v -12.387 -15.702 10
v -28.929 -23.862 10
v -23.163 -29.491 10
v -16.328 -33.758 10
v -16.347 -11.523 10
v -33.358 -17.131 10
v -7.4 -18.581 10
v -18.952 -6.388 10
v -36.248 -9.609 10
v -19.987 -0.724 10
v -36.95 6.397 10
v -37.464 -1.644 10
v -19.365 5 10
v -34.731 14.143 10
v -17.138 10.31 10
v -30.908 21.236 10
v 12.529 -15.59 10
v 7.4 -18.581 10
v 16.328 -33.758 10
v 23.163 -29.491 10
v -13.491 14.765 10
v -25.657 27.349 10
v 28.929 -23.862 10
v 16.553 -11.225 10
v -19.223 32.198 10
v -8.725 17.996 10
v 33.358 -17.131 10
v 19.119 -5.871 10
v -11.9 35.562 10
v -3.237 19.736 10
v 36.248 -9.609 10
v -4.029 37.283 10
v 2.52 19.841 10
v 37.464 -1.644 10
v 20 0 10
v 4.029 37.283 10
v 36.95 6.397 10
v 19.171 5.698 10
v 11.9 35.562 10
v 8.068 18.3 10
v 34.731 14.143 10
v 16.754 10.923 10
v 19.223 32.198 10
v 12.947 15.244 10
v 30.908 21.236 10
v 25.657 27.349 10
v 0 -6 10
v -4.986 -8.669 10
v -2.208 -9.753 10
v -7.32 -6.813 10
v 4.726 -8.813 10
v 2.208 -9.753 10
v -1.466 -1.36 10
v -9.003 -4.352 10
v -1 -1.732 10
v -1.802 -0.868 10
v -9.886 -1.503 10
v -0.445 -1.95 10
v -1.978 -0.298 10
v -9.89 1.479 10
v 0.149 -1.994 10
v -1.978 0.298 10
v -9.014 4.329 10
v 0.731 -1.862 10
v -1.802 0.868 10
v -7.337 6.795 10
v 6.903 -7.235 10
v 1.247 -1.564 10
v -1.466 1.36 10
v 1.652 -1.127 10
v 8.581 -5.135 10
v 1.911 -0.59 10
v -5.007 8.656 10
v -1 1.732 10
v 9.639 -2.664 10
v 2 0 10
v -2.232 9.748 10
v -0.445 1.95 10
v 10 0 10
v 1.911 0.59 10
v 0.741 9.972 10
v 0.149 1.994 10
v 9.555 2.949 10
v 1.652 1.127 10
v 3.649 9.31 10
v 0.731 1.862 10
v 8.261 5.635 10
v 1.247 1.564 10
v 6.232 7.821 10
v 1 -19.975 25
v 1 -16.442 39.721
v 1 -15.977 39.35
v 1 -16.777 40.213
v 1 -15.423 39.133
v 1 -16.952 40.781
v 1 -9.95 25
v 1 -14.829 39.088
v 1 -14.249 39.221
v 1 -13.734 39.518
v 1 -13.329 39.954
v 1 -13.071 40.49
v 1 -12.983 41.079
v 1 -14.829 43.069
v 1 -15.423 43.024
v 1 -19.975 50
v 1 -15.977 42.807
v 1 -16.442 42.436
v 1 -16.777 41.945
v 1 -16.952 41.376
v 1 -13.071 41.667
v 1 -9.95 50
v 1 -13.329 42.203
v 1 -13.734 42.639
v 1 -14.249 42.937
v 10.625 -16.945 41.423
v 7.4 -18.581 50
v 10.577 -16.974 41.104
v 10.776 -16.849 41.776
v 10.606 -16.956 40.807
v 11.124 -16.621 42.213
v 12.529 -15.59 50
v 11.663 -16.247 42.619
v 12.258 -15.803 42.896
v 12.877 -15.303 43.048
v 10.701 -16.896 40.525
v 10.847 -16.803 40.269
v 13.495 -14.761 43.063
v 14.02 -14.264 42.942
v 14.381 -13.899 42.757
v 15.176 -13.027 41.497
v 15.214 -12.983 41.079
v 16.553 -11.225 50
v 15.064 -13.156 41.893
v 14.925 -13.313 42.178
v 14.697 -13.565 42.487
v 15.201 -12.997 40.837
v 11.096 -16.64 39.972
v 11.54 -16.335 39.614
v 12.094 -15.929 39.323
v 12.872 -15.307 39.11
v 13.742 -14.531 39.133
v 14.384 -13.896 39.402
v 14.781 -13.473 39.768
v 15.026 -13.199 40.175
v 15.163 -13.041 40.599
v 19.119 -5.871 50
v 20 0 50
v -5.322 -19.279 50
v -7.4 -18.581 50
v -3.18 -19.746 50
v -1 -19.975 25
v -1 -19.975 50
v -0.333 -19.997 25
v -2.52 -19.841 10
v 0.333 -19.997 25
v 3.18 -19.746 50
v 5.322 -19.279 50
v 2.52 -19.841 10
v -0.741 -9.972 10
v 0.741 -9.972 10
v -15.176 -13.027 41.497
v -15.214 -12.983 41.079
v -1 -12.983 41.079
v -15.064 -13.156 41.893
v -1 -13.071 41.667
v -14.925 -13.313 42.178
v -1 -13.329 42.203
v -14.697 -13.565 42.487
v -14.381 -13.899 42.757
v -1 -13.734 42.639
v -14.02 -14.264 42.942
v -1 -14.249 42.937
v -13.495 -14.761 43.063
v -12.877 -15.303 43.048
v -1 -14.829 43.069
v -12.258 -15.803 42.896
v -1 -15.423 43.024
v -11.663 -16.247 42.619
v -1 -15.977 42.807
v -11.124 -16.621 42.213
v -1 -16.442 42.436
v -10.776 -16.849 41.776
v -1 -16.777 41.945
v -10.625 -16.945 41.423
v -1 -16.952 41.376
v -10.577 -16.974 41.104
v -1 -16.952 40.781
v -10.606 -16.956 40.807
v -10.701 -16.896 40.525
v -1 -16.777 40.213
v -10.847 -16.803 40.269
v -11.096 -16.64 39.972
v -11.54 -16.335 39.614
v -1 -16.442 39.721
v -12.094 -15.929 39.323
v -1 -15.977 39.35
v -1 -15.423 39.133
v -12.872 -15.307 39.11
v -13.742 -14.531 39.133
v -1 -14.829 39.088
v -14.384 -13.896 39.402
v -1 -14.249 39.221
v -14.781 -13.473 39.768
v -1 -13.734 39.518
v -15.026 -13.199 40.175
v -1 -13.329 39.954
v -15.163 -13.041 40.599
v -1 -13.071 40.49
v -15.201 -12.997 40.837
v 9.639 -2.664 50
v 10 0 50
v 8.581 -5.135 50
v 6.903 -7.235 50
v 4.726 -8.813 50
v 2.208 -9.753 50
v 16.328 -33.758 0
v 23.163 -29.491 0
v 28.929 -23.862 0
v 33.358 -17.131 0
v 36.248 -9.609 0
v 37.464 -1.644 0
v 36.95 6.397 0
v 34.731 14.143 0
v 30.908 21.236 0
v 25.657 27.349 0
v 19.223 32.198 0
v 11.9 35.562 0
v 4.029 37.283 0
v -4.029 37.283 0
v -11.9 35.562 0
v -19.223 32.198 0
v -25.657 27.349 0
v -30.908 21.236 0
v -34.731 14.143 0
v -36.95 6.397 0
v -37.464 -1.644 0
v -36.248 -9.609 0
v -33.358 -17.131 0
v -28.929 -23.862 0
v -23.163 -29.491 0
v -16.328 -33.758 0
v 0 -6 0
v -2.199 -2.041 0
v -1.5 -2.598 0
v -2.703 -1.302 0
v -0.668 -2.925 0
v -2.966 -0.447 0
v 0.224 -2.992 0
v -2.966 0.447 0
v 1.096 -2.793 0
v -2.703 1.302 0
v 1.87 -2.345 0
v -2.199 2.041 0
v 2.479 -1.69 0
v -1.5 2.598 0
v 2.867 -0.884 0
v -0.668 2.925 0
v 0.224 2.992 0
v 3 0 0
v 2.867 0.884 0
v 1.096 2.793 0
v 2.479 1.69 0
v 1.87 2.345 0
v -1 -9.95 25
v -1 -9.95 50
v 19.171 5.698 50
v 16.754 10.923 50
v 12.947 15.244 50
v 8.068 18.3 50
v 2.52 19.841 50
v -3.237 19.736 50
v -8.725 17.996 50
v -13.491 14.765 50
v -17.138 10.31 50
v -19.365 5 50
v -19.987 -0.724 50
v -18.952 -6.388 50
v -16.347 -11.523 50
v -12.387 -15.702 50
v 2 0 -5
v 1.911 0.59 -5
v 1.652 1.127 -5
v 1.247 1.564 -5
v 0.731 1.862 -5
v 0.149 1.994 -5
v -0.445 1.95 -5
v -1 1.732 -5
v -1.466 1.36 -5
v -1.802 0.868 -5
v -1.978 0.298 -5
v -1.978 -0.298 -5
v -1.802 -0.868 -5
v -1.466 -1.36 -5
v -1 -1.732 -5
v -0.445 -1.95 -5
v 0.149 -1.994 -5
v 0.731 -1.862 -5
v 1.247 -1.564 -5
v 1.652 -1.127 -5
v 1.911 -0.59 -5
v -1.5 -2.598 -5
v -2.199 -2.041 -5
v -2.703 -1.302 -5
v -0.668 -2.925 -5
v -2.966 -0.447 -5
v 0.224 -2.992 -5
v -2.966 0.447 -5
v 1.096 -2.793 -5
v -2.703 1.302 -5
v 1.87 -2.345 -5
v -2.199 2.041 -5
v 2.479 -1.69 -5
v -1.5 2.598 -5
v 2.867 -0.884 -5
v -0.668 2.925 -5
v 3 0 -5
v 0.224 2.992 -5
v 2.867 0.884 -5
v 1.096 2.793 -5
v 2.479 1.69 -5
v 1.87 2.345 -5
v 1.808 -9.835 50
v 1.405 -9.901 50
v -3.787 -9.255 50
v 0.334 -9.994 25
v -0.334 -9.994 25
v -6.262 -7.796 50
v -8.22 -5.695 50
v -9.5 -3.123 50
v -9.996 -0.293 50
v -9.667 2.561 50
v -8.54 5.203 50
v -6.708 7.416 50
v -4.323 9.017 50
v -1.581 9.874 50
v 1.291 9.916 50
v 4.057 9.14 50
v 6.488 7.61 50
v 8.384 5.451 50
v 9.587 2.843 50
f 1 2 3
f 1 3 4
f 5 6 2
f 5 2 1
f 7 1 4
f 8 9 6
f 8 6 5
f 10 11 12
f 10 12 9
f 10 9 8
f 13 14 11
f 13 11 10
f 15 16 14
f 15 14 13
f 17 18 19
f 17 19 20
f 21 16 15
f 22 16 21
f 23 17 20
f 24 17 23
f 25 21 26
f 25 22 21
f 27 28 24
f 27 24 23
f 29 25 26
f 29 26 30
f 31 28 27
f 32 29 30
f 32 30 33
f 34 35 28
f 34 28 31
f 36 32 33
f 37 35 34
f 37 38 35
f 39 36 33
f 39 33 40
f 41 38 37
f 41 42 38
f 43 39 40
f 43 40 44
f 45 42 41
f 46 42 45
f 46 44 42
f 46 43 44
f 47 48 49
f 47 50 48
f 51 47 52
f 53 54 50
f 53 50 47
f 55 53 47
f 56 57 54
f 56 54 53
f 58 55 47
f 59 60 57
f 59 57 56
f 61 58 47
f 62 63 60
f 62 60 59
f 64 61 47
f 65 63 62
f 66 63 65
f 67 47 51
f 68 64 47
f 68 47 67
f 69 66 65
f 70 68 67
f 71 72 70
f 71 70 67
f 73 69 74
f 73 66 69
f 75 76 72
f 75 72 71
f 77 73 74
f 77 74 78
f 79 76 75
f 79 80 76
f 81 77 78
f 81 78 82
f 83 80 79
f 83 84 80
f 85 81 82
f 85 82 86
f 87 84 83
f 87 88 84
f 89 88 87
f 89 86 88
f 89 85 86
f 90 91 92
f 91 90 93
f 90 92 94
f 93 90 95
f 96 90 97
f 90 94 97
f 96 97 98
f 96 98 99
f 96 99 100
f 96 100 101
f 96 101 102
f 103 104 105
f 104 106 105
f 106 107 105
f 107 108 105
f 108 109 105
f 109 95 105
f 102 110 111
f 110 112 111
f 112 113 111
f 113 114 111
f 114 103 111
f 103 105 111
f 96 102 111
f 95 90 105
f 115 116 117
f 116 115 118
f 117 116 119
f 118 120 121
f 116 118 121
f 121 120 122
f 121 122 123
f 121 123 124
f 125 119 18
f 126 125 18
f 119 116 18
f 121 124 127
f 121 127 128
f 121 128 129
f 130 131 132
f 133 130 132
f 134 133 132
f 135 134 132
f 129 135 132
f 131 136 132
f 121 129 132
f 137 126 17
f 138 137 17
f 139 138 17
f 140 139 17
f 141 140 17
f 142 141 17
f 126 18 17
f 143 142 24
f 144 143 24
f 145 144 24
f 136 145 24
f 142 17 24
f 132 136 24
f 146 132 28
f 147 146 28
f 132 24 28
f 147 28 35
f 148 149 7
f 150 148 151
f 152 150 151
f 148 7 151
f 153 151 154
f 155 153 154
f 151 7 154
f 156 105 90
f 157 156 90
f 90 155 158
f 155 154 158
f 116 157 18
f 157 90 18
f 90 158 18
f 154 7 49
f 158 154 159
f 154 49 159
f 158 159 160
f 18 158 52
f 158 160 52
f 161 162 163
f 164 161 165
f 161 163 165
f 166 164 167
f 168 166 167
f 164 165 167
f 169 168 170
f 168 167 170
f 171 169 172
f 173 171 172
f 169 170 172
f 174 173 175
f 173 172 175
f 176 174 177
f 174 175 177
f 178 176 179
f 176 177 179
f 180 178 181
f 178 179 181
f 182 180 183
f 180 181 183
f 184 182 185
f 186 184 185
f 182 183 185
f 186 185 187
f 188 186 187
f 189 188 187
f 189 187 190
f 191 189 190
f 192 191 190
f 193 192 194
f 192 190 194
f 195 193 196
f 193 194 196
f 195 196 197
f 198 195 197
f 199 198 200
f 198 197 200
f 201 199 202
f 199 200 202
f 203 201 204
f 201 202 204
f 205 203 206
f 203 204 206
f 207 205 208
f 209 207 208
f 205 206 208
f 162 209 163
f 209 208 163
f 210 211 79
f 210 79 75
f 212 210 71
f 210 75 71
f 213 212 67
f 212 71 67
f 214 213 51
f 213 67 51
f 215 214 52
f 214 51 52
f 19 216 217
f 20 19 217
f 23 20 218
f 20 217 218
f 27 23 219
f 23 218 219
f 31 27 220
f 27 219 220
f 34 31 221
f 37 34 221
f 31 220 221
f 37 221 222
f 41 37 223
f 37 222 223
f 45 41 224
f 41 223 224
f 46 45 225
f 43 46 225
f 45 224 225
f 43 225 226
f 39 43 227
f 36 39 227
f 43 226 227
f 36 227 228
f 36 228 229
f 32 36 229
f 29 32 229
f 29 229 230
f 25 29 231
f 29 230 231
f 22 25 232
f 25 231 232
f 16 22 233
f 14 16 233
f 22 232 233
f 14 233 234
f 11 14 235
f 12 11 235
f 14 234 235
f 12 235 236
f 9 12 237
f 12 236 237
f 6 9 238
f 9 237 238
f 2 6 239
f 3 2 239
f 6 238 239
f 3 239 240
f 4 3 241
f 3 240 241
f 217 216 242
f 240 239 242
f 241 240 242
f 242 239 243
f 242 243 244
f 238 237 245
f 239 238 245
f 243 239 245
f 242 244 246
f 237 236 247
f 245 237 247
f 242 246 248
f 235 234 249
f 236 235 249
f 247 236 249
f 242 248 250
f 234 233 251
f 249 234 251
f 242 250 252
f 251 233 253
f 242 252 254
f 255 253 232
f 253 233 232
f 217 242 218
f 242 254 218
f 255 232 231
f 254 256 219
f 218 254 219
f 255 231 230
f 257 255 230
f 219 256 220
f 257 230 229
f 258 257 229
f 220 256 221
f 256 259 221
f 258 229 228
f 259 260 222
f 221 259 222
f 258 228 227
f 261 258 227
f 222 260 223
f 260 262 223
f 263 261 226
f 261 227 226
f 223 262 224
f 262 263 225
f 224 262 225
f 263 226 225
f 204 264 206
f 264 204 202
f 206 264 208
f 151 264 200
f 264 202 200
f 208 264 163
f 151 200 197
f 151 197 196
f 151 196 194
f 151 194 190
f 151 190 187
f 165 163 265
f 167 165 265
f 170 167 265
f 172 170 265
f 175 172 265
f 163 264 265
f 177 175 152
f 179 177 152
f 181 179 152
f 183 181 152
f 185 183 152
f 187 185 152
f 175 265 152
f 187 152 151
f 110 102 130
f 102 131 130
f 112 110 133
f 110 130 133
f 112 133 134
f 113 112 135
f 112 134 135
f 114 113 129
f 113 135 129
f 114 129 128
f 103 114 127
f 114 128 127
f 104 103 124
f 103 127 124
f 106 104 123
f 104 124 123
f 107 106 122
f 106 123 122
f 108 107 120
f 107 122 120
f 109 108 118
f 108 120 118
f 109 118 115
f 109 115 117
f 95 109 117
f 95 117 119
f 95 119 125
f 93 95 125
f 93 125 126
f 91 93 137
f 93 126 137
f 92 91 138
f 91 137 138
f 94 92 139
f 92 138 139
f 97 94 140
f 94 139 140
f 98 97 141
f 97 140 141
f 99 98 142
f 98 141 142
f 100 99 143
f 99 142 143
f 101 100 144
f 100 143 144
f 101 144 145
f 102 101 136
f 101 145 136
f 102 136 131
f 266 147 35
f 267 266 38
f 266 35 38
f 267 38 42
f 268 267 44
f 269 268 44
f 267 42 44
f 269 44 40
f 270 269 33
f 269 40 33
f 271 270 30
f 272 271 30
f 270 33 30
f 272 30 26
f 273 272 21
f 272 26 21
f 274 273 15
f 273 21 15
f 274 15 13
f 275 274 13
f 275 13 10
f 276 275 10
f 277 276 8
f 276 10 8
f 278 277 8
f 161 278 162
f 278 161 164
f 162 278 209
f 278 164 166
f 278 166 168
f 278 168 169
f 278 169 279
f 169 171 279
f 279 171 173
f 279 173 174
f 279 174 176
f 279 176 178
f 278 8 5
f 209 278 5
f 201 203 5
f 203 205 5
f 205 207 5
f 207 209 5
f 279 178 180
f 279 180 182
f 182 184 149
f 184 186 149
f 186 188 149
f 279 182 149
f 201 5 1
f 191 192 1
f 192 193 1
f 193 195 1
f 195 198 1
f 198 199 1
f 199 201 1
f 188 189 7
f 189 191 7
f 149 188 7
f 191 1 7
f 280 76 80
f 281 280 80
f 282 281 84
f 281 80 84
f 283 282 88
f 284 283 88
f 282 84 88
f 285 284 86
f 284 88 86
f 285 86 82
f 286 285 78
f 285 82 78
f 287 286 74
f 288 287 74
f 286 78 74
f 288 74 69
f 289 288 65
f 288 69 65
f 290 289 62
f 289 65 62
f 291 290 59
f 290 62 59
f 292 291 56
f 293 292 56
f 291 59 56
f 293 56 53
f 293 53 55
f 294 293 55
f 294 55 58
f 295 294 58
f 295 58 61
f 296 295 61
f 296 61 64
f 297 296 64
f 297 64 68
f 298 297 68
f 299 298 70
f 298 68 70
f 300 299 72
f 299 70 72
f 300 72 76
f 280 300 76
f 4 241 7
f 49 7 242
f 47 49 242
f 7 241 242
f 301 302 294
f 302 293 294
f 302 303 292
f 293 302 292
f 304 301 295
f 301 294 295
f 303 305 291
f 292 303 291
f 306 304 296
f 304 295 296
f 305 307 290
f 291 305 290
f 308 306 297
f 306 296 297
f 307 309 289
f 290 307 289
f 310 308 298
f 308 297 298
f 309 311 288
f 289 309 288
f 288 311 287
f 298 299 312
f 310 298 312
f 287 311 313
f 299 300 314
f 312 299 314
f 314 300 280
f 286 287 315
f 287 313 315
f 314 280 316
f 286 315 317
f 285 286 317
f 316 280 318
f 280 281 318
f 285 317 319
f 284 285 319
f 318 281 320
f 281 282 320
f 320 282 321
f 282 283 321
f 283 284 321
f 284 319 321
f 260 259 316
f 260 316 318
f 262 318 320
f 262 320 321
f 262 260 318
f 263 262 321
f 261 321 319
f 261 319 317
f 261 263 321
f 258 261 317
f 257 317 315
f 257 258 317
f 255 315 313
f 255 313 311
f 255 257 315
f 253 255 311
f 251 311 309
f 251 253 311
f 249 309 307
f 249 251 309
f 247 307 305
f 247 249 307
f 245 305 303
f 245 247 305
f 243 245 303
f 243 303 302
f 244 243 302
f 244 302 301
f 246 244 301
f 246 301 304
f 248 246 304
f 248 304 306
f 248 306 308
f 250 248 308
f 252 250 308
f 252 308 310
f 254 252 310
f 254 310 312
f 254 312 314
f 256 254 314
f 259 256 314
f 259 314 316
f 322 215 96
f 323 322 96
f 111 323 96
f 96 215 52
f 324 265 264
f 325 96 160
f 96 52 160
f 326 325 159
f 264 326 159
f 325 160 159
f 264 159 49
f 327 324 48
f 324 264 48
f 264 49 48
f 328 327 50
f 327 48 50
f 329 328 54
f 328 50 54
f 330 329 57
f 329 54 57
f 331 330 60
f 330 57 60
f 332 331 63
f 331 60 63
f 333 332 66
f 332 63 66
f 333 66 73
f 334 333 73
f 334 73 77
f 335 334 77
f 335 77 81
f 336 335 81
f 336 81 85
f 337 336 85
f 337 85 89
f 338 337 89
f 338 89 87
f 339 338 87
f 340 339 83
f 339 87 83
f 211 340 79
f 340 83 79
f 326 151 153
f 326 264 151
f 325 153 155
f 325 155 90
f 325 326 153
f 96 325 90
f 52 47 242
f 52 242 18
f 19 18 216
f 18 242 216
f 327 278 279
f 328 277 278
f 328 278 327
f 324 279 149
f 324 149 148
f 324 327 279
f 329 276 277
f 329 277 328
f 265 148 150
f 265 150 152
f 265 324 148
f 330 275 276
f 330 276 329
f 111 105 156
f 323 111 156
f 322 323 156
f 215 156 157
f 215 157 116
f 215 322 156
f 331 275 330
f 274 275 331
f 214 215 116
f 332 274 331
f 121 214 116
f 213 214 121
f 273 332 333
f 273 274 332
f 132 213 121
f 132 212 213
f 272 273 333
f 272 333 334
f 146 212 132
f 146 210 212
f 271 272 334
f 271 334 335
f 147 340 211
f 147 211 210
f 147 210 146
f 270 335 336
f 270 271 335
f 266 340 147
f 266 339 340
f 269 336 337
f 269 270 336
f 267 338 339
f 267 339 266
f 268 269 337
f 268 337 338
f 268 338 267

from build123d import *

# Parameters (mm, degrees)
F0_R     = 3
F1_DEPTH = 10
F3_DEPTH = 40
F5_DEPTH = 25
F6_R     = 3
F6_R_2   = 2
F7_DEPTH = 15
F8_R     = 1.9959654756
F9_DEPTH = 19.5


with BuildPart() as f1:
    # F0 (on Top) → F1 (new body)
    with BuildSketch(Plane.XY):
        with BuildLine():
            Line((0, -6), (16.3284806108, -33.7584170384))
            ThreePointArc((16.3284806108, -33.7584170384), (0, 37.5), (-16.3284806108, -33.7584170384))
            Line((-16.3284806108, -33.7584170384), (0, -6))
        make_face()
        Circle(F0_R, mode=Mode.SUBTRACT)
    extrude(amount=F1_DEPTH)

    # F2 (on face) → F3 (join)
    with BuildSketch(Plane.XY.offset(10)):
        with BuildLine():
            Line((-2.2077877193, -9.7532391228), (-7.4003026682, -18.5805145359))
            ThreePointArc((-7.4003026682, -18.5805145359), (0, -20), (7.4003026682, -18.5805145359))
            Line((7.4003026682, -18.5805145359), (2.2077877193, -9.7532391228))
            ThreePointArc((2.2077877193, -9.7532391228), (0, -10), (-2.2077877193, -9.7532391228))
        make_face()
        with BuildLine():
            ThreePointArc((7.4003026682, -18.5805145359), (16.5530367813, -11.2248373404), (20, 0))
            ThreePointArc((20, 0), (-11.2248373404, 16.5530367813), (-7.4003026682, -18.5805145359))
            Line((-7.4003026682, -18.5805145359), (-2.2077877193, -9.7532391228))
            ThreePointArc((-2.2077877193, -9.7532391228), (-6.2418796371, 7.8127420664), (10, 0))
            ThreePointArc((10, 0), (7.8127420664, -6.2418796371), (2.2077877193, -9.7532391228))
            Line((2.2077877193, -9.7532391228), (7.4003026682, -18.5805145359))
        make_face()
    extrude(amount=F3_DEPTH)

    # F4 (on face) → F5 (cut)
    with BuildSketch(Plane.XY.offset(50)):
        with BuildLine():
            ThreePointArc((-1, -19.9749843554), (0, -20), (1, -19.9749843554))
            Line((1, -19.9749843554), (1, -9.9498743711))
            ThreePointArc((1, -9.9498743711), (0, -10), (-1, -9.9498743711))
            Line((-1, -9.9498743711), (-1, -19.9749843554))
        make_face()
    extrude(amount=-F5_DEPTH, mode=Mode.SUBTRACT)

    # F6 (on face) → F7 (join)
    with BuildSketch(Plane.XY.offset(10)):
        Circle(F6_R)
        Circle(F6_R_2, mode=Mode.SUBTRACT)
    extrude(amount=-F7_DEPTH)

    # F8 (on Right) → F9 (cut, symmetric)
    with BuildSketch(Plane.YZ):
        with Locations((-14.9785717949, 41.0785749555)):
            Circle(F8_R)
    extrude(amount=F9_DEPTH, both=True, mode=Mode.SUBTRACT)


solid = f1.part
